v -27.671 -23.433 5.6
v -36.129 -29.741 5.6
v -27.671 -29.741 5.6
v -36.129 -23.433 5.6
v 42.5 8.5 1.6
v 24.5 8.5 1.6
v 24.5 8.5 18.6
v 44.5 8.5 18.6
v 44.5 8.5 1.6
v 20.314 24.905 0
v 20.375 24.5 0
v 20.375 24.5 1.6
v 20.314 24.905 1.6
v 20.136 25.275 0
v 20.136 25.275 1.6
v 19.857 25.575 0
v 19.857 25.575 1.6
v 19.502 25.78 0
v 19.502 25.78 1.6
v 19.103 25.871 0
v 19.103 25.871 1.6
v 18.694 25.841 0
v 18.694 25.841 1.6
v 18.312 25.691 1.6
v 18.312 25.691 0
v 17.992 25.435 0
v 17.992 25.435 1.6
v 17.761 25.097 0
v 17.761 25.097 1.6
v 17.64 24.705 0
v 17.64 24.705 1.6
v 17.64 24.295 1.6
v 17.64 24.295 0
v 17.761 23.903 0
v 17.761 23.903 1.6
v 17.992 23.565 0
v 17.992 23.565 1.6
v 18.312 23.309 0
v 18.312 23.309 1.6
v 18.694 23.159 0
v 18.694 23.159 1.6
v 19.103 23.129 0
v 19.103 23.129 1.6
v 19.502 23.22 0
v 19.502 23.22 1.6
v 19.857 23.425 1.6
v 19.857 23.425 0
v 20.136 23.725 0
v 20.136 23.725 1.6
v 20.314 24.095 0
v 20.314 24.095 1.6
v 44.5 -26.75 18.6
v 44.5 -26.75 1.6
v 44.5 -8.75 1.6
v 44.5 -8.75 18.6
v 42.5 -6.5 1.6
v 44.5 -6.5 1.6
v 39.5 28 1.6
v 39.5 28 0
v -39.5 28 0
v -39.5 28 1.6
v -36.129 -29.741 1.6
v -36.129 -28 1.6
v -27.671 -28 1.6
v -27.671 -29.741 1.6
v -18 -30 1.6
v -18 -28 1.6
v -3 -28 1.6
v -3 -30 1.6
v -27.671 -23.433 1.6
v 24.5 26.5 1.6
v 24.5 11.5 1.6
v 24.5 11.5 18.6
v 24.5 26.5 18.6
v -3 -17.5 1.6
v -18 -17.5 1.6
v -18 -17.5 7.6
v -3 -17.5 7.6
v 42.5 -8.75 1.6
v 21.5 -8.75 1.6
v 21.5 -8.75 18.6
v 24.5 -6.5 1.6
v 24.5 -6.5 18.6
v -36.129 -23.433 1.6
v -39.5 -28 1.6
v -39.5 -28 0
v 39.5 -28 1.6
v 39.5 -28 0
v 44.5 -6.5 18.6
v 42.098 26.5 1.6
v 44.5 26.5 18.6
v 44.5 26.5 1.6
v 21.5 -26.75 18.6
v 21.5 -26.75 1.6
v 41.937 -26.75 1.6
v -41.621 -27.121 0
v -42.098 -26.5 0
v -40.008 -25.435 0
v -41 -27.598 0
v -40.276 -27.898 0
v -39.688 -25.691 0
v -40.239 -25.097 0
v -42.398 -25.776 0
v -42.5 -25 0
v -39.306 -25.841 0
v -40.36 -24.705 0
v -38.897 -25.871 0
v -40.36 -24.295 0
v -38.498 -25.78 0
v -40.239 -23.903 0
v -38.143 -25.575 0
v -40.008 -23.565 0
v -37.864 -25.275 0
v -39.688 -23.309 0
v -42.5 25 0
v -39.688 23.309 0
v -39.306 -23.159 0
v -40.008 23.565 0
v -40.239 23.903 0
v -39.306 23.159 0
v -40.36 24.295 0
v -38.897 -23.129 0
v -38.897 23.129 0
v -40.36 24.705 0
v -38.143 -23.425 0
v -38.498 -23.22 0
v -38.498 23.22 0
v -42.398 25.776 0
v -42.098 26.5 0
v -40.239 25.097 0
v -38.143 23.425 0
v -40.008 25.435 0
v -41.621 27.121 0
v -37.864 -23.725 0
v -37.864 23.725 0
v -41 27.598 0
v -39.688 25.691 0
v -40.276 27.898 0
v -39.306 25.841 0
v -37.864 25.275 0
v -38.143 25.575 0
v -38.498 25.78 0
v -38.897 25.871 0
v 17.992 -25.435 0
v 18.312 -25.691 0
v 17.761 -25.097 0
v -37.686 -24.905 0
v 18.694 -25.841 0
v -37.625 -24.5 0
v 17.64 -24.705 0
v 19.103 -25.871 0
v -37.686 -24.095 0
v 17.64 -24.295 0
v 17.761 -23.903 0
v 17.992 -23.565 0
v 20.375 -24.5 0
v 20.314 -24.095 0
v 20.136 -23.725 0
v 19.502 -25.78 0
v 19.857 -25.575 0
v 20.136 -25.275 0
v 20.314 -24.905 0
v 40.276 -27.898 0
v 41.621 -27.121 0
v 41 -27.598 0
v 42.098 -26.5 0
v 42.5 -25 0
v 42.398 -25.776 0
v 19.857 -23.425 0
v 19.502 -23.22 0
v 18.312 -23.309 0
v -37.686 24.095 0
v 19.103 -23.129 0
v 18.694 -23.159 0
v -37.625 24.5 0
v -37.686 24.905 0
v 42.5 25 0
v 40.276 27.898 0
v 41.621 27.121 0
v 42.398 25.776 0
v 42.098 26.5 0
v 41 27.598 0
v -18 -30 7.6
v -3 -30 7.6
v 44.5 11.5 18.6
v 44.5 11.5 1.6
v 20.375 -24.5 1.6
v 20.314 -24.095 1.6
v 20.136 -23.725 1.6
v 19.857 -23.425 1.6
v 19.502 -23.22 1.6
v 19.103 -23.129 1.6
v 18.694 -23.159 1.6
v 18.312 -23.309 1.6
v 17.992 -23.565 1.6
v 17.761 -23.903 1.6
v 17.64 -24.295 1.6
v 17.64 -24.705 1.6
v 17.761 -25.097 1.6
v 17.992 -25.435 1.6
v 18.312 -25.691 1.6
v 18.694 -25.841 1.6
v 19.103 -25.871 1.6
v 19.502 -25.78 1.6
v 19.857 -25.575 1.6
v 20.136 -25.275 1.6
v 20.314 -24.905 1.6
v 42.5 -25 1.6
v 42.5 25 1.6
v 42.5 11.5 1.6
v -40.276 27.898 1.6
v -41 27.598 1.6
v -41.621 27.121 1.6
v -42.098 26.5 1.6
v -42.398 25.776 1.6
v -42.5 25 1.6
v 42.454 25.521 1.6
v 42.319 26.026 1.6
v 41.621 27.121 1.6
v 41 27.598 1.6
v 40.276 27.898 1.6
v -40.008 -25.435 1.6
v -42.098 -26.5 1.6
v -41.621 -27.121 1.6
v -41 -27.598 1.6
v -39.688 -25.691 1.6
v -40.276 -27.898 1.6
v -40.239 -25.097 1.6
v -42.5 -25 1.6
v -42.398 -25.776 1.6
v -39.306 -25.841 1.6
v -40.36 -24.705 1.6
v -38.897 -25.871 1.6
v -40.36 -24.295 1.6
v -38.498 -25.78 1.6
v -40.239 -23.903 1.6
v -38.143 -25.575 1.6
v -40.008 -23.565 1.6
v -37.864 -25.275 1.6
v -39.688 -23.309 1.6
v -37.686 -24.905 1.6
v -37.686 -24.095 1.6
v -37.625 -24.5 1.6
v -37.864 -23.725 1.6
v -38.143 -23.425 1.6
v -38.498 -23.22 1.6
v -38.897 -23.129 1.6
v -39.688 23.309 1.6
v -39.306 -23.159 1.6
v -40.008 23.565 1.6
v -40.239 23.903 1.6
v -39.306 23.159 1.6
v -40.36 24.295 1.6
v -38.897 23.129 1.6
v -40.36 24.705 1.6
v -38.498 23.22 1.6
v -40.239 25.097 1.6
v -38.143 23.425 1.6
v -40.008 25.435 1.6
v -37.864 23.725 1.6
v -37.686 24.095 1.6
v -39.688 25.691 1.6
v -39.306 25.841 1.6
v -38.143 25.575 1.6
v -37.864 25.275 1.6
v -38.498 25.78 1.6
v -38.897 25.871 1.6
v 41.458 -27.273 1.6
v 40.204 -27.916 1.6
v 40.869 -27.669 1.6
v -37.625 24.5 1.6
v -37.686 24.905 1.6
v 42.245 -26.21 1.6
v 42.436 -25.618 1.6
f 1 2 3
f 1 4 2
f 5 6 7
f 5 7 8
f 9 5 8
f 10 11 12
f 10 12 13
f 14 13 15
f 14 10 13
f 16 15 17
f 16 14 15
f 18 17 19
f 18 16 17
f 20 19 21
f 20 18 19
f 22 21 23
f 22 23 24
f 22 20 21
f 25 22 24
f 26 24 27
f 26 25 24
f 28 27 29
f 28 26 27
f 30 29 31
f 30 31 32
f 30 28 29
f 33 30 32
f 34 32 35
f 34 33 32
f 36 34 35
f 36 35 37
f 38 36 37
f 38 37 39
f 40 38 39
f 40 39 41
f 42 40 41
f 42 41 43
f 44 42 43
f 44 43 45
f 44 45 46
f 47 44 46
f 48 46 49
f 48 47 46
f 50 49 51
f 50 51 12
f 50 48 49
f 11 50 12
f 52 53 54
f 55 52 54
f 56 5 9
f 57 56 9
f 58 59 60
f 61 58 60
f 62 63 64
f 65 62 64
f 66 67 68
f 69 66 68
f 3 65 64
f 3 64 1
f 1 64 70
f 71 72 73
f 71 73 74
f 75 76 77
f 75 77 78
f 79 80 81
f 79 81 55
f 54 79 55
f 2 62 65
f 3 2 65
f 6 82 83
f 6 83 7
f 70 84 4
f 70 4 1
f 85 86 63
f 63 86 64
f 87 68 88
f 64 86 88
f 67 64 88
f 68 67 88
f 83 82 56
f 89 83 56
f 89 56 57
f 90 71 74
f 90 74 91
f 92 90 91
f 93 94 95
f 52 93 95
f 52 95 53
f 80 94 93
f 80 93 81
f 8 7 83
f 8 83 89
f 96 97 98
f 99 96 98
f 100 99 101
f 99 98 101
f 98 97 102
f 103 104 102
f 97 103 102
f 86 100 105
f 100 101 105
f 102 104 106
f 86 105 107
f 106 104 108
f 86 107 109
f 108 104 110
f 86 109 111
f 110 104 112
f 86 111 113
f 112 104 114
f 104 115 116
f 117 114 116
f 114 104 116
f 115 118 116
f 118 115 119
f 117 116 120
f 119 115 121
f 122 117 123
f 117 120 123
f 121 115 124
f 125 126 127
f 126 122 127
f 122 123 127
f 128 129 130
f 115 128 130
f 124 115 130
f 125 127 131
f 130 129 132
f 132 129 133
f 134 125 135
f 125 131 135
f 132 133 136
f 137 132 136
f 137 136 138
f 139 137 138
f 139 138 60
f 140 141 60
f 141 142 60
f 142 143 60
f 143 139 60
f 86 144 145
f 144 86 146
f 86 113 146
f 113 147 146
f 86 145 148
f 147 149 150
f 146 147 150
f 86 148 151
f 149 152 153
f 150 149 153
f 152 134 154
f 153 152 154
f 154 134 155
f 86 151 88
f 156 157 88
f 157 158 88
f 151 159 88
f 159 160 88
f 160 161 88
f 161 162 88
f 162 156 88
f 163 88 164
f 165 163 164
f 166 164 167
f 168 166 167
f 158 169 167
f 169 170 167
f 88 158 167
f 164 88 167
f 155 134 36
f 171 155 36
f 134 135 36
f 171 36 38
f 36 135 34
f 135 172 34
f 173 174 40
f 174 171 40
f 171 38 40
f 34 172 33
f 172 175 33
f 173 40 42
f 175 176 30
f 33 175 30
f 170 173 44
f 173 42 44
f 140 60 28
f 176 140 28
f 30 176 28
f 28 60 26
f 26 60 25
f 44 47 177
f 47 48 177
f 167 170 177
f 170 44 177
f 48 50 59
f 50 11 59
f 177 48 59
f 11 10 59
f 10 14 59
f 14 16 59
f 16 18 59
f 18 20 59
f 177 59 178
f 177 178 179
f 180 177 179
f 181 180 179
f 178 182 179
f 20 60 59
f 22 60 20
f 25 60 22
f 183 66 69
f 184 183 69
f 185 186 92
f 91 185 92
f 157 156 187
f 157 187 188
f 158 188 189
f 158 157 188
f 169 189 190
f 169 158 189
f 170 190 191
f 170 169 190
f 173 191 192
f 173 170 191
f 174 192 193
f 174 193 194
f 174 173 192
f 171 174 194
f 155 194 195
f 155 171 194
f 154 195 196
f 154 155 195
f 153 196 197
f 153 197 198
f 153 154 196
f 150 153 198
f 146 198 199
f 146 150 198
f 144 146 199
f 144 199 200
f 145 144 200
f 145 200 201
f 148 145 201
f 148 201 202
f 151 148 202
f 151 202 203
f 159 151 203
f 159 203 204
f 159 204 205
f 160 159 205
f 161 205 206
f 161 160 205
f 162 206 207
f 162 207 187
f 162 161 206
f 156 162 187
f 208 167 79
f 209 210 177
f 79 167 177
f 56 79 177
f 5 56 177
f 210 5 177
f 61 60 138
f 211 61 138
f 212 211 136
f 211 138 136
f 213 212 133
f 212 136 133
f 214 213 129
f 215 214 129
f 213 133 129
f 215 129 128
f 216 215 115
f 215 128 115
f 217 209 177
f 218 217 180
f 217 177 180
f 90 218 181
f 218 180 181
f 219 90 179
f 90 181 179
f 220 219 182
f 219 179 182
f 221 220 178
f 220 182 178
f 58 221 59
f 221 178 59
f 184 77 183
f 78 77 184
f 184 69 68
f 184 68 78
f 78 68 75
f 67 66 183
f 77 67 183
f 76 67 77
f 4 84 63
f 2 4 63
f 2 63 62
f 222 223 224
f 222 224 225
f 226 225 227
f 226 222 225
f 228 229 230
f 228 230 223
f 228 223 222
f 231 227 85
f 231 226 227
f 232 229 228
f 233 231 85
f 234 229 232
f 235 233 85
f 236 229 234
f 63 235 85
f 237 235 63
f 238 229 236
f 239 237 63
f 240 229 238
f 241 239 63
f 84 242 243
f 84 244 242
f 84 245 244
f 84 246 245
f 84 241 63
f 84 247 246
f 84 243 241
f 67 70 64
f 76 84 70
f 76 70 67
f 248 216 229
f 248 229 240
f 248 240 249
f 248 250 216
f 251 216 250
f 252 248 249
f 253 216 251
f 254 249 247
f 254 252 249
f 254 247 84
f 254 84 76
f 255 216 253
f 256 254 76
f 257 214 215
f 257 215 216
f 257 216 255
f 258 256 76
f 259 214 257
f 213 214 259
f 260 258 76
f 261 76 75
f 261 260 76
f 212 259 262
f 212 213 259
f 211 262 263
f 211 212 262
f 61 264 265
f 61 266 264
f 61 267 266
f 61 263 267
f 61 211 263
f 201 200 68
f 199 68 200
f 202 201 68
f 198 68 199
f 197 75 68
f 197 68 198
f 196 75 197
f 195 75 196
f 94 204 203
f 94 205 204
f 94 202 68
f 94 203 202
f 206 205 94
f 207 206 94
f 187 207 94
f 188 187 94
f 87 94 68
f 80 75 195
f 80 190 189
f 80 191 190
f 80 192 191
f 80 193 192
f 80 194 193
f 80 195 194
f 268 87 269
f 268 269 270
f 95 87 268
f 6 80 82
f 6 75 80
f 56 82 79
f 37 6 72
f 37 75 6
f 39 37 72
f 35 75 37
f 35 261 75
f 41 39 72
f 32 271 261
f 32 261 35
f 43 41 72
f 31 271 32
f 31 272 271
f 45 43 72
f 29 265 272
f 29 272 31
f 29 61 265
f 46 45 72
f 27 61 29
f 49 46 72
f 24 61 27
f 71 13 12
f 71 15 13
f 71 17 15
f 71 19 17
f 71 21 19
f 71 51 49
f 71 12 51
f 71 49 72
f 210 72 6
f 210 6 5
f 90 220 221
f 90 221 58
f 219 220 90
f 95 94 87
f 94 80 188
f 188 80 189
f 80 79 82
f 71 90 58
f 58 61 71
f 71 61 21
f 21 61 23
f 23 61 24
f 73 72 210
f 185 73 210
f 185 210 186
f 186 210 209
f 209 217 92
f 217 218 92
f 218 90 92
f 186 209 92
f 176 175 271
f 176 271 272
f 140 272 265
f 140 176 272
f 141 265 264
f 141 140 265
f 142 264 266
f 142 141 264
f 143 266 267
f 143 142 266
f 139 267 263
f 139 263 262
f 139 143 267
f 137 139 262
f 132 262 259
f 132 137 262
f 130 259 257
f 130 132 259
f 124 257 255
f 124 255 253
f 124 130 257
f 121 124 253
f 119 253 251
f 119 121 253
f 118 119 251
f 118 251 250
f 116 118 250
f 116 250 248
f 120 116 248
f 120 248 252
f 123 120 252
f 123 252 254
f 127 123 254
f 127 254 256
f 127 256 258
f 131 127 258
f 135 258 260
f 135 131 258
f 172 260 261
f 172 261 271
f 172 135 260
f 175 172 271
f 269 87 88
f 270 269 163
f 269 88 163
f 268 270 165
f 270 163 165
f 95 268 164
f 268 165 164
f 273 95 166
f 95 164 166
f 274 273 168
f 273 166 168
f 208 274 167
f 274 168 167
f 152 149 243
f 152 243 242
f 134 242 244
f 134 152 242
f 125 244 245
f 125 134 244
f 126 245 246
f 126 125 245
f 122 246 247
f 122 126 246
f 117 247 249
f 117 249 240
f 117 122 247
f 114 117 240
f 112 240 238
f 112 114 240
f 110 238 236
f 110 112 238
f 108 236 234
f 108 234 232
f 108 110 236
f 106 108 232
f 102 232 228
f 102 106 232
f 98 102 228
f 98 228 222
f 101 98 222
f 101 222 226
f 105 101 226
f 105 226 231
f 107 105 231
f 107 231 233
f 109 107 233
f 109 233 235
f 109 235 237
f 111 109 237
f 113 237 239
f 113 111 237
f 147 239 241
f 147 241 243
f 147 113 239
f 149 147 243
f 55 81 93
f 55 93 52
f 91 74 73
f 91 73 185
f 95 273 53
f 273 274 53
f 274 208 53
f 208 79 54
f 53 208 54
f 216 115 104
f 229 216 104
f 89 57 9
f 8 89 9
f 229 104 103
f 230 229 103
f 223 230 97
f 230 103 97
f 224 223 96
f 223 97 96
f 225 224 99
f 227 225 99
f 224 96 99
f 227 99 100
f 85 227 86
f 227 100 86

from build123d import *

# Parameters (mm, degrees)
F0_R     = 1.375
F1_DEPTH = 1.6
F2_W     = 8.457642
F2_H     = 1.740684
F2_H_2   = 4.566714
F3_DEPTH = 4
F4_W     = 20
F4_H     = 15
F4_W_2   = 23
F4_H_2   = 18
F5_DEPTH = 17
F6_W     = 15
F6_H     = 12.5
F7_DEPTH = 6


with BuildPart() as f1:
    # F0 (on Top) → F1 (new body)
    with BuildSketch(Plane.XY):
        with BuildLine():
            Line((-39.5, -28), (39.5, -28))
            ThreePointArc((39.5, -28), (41.62132, -27.12132), (42.5, -25))
            Line((42.5, -25), (42.5, 25))
            ThreePointArc((42.5, 25), (41.62132, 27.12132), (39.5, 28))
            Line((39.5, 28), (-39.5, 28))
            ThreePointArc((-39.5, 28), (-41.62132, 27.12132), (-42.5, 25))
            Line((-42.5, 25), (-42.5, -25))
            ThreePointArc((-42.5, -25), (-41.62132, -27.12132), (-39.5, -28))
        make_face()
        with Locations((-39, -24.5)):
            Circle(F0_R, mode=Mode.SUBTRACT)
        with Locations((19, -24.5)):
            Circle(F0_R, mode=Mode.SUBTRACT)
        with Locations((-39, 24.5)):
            Circle(F0_R, mode=Mode.SUBTRACT)
        with Locations((19, 24.5)):
            Circle(F0_R, mode=Mode.SUBTRACT)
    extrude(amount=F1_DEPTH)

    # F2 (on face) → F3 (join)
    with BuildSketch(Plane.XY.offset(1.6)):
        with Locations((-31.9, -28.870342)):
            Rectangle(F2_W, F2_H)
        with Locations((-31.9, -25.716643)):
            Rectangle(F2_W, F2_H_2)
    extrude(amount=F3_DEPTH)

    # F4 (on face) → F5 (join)
    with BuildSketch(Plane.XY.offset(1.6)):
        with Locations((34.5, 19)):
            Rectangle(F4_W, F4_H)
        with Locations((34.5, 1)):
            Rectangle(F4_W, F4_H)
        with Locations((33, -17.75)):
            Rectangle(F4_W_2, F4_H_2)
    extrude(amount=F5_DEPTH)

    # F6 (on face) → F7 (join)
    with BuildSketch(Plane.XY.offset(1.6)):
        with Locations((-10.5, -23.75)):
            Rectangle(F6_W, F6_H)
    extrude(amount=F7_DEPTH)


solid = f1.part
